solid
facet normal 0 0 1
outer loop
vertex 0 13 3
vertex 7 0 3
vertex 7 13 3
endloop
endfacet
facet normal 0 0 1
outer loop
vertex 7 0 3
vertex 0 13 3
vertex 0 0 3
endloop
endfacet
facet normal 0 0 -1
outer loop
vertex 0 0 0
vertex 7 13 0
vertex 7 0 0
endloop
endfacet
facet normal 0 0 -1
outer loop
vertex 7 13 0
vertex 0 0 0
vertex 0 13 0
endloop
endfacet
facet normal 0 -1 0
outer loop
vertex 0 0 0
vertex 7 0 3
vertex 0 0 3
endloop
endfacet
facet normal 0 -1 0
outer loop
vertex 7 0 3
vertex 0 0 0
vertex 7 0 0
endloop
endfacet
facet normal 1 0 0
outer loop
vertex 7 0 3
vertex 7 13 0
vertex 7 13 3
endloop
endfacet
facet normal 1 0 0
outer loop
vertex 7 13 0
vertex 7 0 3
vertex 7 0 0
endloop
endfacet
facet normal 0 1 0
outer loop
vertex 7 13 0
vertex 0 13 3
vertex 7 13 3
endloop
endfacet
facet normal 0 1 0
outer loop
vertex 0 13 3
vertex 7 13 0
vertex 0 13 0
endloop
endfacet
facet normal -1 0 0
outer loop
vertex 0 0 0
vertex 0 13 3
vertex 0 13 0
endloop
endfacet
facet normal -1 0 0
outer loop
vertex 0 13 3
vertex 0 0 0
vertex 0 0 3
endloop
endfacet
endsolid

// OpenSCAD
// Generated by SolidPython 1.0.1 on 2020-07-29 00:46:55


cube(size = [7, 13, 3]);
/***********************************************
*********      SolidPython code:      **********
************************************************
 
# import packages: SolidPython
from solid import *
from solid.utils import *
from itertools import chain, combinations, permutations


class Resize:

    def __init__(self, scad_file):
        self.scad_file = scad_file
        #self.scad_file = import_scad(scad_file)
        # cone/cylinder param:
        self.r1 = 0
        self.r2 = 0
        self.h = 0
        # rectangular prism param:
        self.w = 0
        self.l = 0
        # ellipse param:
        self.r = 0

    # import OpenScad code (file name corresponds to shape)


    # classify shape + parameters
    def assign(self, param1, param2, param3):
        if self.scad_file == 'cone.scad':
            self.r1 = param1
            self.r2 = param2
            self.h = param3
        elif self.scad_file == 'cylinder.scad':
            self.r1 = param1
            self.r2 = param2
            self.h = param3
        elif self.scad_file == 'rectangularPrism.scad':
            self.h = param1
            self.l = param2
            self.w = param3
        else:
            self.r = param1
            self.h = param2

    # resize parameters
    def iterate(self):
        x = range(3, 20, 2)
        i = 1
        if self.scad_file == 'cone.scad':
            tempList = list(permutations(x, 2))
            for temp in tempList:
                param1 = temp[0]
                param2 = temp[1]
                filepath = 'produced_scad_files/' + 'cone' + str(param1) + '_' + str(param2) + '_' + '.scad'
                scad_render_to_file(cylinder(h=param1, r1=param2, r2=0), filepath)

        elif self.scad_file == 'cylinder.scad':
            tempList = list(permutations(x, 3))
            for temp in tempList:
                param1 = temp[0]
                param2 = temp[1]
                filepath = 'produced_scad_files/' + 'cylinder' + str(param1) + '_' + str(param2) + '_' + '.scad'
                scad_render_to_file(cylinder(h=param1, r1=param2, r2=param2), filepath)

        elif self.scad_file == 'rectangularPrism.scad':
            tempList = list(permutations(x, 3))
            for temp in tempList:
                param1 = temp[0]
                param2 = temp[1]
                param3 = temp[2]
                filepath = 'produced_scad_files/' + 'rectangularPrism' + str(param1) + '_' + str(param2) + '_' + str(
                    param3) + '.scad'
                scad_render_to_file(cube(size=(param1, param2, param3)), filepath)

        elif self.scad_file == 'ellipse.scad':
            tempList = list(permutations(x, 4))
            for temp in tempList:
                param1 = temp[0]
                param2 = temp[1]
                param3 = temp[2]
                param4 = temp[3]
                filepath = 'produced_scad_files/' + 'ellipse' + str(param1) + '_' + str(param2) + '_' + str(param3) + '_' + str(param4) + '.scad'
                scad_render_to_file(scale([param1, param2, param3])(sphere(r=param4)), filepath)

    def render_to_scadfile(self):
        scad_render_to_file(scad, 'example.scad') 
 
************************************************/
